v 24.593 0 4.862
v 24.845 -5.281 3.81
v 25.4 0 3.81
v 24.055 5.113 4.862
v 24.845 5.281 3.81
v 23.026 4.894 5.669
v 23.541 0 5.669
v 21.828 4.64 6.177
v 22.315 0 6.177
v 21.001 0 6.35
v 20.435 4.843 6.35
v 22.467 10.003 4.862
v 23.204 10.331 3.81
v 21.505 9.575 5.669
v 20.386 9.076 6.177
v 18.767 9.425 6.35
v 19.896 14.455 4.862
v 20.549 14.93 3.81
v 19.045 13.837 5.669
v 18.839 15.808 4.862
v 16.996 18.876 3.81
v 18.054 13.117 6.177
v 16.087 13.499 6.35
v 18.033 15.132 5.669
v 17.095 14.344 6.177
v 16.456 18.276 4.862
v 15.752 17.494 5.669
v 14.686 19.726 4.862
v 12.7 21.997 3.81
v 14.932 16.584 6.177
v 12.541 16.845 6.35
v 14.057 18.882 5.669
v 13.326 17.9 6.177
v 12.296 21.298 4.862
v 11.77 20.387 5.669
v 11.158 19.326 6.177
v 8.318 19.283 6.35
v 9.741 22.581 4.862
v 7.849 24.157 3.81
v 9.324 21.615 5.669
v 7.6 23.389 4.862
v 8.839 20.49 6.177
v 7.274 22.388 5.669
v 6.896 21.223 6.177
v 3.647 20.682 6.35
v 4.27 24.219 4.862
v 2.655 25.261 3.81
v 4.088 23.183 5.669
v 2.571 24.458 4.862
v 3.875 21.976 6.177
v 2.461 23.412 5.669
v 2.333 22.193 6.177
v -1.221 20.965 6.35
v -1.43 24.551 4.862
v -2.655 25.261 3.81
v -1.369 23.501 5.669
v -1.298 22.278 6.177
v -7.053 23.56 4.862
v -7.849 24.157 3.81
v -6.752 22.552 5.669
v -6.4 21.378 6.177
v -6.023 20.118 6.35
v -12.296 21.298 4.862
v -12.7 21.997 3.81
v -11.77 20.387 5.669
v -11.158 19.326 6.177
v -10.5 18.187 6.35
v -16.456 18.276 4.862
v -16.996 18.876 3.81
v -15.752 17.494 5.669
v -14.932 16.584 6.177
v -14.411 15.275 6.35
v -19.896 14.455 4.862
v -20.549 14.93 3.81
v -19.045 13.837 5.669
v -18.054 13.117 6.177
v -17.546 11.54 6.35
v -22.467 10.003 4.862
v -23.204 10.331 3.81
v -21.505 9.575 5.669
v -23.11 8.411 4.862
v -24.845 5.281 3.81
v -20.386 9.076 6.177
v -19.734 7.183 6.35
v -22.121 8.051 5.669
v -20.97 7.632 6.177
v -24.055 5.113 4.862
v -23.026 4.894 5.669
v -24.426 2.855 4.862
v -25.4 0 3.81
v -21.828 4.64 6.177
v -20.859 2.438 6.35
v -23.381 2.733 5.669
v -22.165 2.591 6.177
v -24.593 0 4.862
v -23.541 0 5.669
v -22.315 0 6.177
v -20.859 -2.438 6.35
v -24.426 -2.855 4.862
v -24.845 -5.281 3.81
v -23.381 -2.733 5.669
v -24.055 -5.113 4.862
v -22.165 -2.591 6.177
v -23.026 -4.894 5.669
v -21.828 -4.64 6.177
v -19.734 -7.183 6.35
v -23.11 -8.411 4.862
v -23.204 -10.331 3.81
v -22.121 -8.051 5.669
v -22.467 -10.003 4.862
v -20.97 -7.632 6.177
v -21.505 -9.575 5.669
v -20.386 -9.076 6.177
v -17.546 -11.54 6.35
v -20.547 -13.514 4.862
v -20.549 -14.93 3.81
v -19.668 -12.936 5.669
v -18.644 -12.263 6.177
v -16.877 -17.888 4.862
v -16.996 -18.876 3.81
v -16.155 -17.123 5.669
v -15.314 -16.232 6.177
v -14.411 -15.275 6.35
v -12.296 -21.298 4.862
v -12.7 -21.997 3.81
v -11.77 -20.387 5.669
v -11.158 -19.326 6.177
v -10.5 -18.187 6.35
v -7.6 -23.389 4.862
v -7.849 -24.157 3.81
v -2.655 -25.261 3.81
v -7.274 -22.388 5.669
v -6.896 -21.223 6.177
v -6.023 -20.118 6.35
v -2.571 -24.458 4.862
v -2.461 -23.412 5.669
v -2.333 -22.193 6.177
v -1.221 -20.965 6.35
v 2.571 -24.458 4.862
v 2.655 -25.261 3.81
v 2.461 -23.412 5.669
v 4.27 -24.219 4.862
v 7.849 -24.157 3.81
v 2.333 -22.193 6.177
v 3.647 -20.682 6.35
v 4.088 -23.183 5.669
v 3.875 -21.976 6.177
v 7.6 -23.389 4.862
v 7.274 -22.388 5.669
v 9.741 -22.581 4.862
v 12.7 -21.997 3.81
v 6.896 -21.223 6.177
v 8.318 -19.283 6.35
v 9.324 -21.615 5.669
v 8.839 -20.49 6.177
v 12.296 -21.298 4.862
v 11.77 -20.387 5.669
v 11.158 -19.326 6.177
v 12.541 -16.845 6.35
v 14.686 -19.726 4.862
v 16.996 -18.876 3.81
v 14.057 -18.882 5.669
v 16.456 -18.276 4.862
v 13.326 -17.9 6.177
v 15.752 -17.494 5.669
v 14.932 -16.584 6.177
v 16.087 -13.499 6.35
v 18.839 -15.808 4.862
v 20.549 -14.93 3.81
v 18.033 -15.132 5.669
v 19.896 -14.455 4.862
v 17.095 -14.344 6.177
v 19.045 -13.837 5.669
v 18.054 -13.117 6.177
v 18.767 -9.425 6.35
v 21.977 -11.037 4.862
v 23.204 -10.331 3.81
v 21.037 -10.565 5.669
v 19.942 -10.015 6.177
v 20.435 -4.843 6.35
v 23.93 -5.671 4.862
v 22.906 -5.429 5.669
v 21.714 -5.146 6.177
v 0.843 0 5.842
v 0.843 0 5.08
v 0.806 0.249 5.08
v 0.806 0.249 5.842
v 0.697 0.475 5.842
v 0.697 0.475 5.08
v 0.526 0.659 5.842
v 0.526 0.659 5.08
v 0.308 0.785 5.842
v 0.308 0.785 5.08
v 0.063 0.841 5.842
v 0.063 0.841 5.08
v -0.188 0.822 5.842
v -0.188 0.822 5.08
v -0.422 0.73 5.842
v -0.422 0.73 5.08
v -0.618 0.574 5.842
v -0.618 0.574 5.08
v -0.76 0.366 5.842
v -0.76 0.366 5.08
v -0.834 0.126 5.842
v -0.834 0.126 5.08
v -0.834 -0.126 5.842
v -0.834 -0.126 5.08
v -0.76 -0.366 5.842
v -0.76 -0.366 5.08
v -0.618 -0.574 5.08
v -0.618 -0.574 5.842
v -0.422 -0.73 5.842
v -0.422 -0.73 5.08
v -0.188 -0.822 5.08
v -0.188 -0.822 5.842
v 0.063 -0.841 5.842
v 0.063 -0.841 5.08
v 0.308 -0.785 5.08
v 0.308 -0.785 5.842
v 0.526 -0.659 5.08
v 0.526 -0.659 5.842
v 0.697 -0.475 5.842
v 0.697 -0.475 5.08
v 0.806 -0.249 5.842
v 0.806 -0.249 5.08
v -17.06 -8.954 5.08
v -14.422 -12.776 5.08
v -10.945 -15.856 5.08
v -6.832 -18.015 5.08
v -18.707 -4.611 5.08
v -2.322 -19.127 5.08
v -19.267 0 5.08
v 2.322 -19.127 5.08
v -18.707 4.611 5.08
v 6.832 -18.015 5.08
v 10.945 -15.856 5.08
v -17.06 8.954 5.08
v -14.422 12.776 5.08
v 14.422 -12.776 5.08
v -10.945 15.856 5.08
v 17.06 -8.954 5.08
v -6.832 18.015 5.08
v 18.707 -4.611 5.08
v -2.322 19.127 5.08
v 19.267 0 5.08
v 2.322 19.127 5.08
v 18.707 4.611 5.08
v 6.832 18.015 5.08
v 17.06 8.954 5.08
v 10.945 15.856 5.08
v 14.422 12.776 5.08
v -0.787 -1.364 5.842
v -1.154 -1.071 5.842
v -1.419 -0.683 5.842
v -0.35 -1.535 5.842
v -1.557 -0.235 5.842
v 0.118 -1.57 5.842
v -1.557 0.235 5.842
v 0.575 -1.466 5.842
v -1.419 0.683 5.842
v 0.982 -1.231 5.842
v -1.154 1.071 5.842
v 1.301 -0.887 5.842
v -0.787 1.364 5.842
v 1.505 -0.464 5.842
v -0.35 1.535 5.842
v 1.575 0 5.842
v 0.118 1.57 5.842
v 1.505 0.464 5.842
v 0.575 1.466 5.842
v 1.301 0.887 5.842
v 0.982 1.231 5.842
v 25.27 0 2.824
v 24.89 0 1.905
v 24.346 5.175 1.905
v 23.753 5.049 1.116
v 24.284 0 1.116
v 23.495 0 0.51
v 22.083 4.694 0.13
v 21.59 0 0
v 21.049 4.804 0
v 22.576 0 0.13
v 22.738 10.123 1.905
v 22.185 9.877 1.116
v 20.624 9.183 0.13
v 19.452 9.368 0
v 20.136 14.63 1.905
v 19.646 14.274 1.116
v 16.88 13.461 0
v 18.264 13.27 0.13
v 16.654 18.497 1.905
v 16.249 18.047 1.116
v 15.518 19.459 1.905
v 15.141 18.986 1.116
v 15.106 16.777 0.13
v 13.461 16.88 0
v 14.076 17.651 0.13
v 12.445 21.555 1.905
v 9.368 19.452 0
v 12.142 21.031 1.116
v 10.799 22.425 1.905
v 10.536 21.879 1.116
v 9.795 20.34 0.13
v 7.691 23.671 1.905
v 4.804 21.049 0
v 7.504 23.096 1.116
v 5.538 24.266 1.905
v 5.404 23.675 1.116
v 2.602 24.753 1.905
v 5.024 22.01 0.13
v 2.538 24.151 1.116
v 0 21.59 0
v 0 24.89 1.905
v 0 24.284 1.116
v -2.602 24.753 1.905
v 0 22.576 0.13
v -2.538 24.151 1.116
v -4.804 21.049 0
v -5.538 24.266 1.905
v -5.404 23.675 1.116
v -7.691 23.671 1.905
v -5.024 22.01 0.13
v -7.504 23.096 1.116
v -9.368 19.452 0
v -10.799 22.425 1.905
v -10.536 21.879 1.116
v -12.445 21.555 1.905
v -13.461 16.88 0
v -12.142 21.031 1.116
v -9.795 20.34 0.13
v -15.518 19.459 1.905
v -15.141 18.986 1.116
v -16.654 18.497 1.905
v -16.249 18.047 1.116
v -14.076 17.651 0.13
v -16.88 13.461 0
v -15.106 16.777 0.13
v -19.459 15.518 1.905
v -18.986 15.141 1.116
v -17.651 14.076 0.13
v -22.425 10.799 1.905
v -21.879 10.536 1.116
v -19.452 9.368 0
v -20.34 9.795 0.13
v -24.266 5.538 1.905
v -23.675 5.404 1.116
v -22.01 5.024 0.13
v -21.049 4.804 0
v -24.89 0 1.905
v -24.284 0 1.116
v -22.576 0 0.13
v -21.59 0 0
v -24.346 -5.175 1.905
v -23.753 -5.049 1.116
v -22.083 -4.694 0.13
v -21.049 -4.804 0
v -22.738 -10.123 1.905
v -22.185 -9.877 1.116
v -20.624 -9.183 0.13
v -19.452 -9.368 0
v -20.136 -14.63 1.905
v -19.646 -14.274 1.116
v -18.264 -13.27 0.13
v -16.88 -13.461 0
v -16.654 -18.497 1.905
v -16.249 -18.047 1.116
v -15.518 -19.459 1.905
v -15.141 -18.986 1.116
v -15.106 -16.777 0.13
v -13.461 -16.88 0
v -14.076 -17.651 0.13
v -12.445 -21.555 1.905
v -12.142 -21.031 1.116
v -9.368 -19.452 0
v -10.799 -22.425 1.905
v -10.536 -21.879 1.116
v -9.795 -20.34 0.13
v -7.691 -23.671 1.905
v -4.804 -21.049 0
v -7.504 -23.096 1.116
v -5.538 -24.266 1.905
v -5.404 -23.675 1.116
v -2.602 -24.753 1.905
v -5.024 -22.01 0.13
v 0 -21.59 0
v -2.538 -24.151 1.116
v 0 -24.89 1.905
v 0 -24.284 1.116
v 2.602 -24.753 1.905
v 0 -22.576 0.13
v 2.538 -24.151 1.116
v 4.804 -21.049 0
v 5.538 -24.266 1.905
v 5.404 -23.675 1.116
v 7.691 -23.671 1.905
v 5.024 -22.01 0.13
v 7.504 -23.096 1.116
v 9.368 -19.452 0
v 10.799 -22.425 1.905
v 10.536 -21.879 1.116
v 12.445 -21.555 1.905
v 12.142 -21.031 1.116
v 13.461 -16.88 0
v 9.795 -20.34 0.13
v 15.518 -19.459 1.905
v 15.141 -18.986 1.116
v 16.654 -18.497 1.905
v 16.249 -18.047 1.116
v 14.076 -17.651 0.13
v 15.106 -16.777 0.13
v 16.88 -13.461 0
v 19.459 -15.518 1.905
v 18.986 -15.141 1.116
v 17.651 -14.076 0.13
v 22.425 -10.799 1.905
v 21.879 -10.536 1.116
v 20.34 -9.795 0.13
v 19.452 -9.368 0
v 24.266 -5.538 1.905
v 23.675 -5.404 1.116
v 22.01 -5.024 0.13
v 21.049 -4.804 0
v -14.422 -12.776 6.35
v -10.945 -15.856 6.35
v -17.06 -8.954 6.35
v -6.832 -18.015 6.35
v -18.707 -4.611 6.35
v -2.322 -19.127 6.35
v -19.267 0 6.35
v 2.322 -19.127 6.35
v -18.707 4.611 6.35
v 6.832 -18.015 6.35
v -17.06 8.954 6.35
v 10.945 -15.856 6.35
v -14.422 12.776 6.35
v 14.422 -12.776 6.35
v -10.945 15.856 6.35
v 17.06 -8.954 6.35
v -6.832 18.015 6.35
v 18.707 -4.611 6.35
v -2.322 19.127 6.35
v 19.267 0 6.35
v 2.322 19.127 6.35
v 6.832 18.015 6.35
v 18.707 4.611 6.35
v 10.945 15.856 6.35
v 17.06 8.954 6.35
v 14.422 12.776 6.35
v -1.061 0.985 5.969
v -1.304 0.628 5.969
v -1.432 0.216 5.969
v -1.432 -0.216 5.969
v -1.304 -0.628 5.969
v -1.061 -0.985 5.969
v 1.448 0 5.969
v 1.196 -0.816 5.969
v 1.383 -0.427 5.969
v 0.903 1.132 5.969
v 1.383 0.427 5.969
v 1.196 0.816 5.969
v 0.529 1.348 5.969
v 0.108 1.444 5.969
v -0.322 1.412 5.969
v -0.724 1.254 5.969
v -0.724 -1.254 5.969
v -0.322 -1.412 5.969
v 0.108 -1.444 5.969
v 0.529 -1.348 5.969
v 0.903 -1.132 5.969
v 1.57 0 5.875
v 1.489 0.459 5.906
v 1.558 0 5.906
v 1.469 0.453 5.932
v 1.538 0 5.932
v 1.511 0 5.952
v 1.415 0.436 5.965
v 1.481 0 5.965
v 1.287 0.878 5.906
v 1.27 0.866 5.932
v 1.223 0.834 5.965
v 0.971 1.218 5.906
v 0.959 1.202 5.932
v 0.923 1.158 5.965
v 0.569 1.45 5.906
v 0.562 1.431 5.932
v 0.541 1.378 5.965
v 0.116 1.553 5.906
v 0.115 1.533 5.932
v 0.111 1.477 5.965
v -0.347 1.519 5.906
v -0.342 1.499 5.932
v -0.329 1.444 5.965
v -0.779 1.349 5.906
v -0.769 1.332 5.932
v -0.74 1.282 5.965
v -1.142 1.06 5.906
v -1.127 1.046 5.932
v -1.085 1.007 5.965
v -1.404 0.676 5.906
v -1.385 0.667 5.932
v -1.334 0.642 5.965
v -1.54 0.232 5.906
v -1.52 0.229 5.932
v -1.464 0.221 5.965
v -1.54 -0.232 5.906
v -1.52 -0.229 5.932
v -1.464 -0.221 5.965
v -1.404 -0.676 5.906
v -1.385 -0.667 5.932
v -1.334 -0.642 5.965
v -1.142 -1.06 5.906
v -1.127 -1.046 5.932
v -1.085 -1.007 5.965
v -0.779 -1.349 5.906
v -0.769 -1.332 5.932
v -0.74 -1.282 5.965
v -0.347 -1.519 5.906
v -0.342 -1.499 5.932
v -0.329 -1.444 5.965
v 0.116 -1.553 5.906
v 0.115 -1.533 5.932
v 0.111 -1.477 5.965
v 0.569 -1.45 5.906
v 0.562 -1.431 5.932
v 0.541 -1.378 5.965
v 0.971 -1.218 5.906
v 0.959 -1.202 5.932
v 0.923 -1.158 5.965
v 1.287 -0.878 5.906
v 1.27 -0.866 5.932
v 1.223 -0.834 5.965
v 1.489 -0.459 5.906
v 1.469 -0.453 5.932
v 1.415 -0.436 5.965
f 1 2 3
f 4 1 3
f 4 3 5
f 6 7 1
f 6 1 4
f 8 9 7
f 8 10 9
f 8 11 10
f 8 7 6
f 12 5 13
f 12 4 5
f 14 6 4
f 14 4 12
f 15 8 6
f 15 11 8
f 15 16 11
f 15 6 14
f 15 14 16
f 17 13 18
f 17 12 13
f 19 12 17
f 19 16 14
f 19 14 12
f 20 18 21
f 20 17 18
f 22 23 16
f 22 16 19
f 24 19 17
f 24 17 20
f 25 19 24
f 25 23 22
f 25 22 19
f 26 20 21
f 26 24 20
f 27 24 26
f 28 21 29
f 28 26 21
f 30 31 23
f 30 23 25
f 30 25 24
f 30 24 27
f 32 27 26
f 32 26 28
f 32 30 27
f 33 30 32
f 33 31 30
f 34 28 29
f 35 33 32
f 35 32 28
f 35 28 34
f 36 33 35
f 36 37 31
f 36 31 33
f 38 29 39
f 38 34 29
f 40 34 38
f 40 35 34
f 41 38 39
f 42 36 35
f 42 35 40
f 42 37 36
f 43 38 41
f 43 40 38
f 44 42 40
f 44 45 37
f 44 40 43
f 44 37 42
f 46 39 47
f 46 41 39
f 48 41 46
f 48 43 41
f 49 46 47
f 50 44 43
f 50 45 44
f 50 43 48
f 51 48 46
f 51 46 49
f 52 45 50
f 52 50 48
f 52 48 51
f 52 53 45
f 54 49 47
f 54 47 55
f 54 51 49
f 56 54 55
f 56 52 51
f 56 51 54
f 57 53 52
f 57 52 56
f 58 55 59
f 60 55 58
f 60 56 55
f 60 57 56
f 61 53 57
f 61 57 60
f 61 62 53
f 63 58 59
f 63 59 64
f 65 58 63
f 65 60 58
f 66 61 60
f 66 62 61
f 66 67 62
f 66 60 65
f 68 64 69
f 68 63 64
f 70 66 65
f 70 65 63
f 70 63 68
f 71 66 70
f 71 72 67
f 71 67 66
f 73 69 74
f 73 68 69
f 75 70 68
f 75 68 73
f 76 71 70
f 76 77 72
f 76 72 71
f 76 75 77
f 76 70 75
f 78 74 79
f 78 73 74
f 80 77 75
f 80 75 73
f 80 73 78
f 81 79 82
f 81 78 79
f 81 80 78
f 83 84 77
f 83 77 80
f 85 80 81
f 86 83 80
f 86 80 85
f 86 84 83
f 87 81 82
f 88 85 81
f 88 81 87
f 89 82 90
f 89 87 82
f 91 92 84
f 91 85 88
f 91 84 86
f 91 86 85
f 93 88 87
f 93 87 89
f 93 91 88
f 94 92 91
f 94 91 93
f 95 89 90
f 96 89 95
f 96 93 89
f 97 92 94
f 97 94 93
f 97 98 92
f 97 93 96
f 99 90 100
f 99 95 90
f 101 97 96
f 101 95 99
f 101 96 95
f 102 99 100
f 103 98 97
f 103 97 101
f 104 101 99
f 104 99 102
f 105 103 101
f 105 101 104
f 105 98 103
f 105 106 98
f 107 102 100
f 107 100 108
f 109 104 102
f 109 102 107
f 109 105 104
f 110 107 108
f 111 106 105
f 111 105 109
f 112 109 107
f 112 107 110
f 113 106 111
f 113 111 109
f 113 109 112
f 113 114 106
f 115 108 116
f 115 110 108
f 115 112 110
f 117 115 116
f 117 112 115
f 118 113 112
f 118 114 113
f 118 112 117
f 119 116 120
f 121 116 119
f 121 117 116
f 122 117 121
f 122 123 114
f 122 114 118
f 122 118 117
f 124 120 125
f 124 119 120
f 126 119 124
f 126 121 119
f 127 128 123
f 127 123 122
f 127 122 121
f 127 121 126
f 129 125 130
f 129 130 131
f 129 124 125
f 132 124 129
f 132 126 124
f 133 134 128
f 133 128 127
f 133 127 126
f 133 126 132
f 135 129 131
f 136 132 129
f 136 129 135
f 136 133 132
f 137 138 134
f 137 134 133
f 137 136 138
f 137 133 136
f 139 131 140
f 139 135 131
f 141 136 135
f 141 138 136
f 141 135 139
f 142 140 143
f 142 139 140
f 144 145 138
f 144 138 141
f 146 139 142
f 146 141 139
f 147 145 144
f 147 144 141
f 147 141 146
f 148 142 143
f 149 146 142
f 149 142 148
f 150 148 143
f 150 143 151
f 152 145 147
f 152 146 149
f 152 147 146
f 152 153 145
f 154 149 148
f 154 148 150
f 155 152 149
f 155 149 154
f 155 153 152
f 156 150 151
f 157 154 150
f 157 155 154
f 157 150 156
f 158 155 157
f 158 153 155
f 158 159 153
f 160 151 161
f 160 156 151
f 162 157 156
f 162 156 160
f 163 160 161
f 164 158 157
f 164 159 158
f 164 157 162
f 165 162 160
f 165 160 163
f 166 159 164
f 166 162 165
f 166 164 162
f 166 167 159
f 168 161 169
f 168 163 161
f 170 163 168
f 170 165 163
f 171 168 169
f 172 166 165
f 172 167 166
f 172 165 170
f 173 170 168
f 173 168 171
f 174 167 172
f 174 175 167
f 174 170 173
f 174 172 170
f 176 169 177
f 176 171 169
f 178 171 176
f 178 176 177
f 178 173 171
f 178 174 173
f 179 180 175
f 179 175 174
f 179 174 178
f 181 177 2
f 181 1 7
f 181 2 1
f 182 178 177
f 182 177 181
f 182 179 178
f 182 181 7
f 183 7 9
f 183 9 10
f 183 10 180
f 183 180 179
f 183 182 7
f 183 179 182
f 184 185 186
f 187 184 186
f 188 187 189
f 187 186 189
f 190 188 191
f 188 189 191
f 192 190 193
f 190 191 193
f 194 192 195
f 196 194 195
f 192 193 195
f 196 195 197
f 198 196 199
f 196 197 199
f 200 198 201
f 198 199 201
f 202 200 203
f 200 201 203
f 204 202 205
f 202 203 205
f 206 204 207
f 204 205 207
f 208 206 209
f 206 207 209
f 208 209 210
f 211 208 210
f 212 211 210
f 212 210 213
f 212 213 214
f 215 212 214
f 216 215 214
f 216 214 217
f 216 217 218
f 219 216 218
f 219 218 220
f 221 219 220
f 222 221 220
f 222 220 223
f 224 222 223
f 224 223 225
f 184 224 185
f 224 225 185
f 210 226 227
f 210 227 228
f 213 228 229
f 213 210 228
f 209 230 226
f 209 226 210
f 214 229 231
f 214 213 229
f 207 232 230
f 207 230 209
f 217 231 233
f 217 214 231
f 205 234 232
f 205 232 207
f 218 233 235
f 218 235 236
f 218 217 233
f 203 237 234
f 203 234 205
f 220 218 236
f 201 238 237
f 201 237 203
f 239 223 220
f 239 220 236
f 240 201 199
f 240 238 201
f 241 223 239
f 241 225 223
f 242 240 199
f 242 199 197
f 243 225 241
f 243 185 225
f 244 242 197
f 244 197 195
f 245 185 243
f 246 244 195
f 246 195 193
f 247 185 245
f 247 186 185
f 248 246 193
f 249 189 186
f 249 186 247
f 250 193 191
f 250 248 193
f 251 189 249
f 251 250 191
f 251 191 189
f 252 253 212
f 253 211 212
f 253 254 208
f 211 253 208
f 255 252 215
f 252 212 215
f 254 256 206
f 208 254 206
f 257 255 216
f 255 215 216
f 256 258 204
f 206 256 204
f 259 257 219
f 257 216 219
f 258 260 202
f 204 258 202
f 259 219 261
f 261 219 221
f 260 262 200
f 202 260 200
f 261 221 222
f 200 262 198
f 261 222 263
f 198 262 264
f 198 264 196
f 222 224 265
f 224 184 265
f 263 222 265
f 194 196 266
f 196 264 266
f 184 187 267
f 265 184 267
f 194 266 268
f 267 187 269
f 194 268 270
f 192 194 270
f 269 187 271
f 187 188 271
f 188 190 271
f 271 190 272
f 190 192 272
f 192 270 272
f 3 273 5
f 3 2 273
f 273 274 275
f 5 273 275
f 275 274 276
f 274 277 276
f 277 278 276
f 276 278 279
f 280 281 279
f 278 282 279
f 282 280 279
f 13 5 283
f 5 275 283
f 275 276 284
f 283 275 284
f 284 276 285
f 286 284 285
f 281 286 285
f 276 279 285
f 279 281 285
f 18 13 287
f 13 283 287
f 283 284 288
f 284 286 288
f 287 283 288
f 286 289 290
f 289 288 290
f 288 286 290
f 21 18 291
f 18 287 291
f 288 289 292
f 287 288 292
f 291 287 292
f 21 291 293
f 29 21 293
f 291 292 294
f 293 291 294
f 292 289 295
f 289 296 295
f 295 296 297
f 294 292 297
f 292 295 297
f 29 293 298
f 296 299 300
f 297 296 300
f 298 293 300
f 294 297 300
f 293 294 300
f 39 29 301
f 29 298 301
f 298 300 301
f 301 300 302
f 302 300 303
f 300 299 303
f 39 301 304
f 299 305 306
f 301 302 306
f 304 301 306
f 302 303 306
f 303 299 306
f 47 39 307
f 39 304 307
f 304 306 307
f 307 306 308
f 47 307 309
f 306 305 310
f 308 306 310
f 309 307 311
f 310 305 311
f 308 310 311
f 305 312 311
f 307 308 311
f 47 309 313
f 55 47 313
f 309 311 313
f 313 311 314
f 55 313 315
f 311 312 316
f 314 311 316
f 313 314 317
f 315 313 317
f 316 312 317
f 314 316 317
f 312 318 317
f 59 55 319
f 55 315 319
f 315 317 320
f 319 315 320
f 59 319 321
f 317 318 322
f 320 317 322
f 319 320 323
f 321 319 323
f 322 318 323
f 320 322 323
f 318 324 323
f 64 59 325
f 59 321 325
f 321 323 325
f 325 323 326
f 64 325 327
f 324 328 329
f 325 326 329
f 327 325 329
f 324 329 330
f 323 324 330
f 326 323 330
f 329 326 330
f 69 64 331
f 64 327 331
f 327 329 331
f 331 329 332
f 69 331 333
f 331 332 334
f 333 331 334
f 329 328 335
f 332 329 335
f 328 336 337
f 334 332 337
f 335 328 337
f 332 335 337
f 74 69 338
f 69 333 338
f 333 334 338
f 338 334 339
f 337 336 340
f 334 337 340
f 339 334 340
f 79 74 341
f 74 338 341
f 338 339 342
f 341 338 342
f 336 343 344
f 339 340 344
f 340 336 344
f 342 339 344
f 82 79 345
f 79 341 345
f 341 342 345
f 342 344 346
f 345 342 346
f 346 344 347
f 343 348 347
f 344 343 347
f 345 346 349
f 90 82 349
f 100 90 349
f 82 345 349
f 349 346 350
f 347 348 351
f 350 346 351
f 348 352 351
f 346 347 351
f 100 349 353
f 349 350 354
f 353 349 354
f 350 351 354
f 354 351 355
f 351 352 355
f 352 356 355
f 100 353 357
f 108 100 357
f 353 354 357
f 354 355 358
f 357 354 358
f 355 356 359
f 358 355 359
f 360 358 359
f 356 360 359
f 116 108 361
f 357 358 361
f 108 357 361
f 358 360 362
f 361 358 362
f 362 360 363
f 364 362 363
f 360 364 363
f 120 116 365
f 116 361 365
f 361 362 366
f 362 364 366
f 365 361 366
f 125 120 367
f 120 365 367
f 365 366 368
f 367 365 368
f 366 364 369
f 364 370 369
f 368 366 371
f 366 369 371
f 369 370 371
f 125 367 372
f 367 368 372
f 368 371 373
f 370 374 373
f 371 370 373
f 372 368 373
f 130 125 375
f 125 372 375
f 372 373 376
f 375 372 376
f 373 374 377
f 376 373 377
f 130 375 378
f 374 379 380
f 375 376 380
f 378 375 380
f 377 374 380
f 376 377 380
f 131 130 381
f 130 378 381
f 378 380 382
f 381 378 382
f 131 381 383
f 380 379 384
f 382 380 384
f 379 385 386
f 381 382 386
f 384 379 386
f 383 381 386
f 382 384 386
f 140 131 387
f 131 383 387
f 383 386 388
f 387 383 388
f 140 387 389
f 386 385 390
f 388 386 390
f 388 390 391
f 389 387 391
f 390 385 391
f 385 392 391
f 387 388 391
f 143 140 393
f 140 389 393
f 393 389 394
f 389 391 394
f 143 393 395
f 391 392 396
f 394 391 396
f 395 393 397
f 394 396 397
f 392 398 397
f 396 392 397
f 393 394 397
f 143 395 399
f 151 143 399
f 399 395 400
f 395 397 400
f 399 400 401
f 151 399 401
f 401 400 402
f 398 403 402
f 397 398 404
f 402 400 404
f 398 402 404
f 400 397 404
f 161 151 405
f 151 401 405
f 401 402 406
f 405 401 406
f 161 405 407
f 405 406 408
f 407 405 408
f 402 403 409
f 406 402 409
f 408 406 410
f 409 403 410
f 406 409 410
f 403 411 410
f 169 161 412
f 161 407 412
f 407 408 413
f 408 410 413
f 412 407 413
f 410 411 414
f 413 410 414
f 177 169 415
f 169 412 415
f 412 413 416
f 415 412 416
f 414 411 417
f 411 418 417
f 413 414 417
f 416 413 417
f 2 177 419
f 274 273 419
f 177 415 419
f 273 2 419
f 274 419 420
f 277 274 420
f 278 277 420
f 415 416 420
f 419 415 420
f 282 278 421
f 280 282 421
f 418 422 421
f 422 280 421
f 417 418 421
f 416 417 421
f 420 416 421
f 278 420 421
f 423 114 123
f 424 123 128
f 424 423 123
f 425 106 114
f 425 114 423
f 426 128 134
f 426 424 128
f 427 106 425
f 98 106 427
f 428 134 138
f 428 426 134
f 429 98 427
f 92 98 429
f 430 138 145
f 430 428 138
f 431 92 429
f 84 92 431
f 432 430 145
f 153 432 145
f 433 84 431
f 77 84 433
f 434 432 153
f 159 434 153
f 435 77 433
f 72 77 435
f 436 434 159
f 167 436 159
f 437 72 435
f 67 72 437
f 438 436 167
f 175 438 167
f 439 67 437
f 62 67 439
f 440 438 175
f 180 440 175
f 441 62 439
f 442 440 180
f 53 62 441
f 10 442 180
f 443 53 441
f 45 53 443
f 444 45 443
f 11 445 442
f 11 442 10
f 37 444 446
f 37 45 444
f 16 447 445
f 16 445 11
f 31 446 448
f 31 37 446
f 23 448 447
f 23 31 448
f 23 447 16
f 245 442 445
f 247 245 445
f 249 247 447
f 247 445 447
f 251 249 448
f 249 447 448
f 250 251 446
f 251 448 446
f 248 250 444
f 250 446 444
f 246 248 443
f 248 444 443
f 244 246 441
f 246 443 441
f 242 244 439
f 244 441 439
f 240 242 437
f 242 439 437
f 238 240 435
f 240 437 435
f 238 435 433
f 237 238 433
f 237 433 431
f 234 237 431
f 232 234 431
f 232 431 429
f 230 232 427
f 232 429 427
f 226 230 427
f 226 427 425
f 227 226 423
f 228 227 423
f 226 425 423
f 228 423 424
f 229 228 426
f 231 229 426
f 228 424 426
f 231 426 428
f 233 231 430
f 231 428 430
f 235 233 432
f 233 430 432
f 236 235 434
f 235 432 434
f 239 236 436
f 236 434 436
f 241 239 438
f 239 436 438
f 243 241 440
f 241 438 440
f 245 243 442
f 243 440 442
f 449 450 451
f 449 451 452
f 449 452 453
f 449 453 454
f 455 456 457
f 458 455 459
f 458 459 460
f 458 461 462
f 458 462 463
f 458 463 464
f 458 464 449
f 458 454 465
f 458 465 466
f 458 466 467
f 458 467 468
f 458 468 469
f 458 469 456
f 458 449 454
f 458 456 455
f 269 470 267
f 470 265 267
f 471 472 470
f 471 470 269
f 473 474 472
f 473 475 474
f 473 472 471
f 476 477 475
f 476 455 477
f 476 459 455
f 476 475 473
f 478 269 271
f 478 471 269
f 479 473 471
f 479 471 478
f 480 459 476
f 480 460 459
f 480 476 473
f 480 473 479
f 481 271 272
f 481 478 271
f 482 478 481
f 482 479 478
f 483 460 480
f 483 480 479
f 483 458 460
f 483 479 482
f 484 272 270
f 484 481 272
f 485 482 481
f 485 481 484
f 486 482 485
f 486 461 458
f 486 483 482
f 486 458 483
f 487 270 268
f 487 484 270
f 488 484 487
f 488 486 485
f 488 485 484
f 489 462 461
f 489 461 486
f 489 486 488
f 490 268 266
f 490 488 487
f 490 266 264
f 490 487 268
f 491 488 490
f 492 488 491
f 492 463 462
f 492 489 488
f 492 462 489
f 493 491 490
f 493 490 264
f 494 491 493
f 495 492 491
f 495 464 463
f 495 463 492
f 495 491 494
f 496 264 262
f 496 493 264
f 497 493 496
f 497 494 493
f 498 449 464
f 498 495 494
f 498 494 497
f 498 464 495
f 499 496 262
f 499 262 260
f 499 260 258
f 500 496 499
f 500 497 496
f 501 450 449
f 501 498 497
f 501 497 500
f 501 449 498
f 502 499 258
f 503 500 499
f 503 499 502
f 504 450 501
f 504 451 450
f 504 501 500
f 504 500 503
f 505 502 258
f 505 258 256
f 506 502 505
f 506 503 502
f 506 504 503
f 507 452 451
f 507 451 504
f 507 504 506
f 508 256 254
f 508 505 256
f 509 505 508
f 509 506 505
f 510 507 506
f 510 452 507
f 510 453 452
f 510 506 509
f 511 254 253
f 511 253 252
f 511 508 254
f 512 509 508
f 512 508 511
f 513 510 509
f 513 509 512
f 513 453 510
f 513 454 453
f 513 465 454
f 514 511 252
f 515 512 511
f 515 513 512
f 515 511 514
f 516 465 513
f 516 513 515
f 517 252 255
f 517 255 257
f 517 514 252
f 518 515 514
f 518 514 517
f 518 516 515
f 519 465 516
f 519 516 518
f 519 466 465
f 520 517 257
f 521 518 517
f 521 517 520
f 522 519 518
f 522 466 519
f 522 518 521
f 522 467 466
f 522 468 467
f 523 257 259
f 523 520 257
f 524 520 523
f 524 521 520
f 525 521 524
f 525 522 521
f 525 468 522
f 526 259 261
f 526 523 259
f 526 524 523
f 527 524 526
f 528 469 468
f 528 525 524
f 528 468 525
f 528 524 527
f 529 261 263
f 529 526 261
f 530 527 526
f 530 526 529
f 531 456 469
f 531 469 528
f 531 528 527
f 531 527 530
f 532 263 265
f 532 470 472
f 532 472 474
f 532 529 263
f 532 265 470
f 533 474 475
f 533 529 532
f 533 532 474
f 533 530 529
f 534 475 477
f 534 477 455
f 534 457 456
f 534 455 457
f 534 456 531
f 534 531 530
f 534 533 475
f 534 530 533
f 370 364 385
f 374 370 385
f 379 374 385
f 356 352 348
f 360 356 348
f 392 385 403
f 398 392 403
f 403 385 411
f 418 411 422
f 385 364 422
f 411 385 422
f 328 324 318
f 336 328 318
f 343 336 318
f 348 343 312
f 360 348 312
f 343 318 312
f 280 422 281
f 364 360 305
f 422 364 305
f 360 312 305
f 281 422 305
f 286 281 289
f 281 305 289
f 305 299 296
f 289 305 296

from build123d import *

# Parameters (mm, degrees)
F0_R     = 25.4
F1_DEPTH = 6.35
F2_R     = 3.81
F4_R     = 19.2670598269
F5_DEPTH = 1.27
F6_R     = 0.8432395902
F7_DEPTH = 0.762
F8_R     = 1.5748
F8_R_2   = 0.8432395902
F9_DEPTH = 0.127
F10_R    = 0.12699


# Not quite as in the source:
# - a fillet or chamfer that OpenCascade refuses, or shapes differently, is made with other operations: its cross-section is extruded or revolved along the edge and cut away or added
# - a fillet or chamfer is up to 0.001 mm smaller than in the source, because OpenCascade refuses the exact size


with BuildPart() as f1:
    # F0 (on Top) → F1 (new body)
    with BuildSketch(Plane.XY):
        Circle(F0_R)
    extrude(amount=F1_DEPTH)

    # F2
    f2_edges = [f1.edges().sort_by_distance(p)[0] for p in [
        (-25.4, 0, 0),
    ]]
    fillet(f2_edges, radius=F2_R)

    # F3: fillet of radius 5.08 on 1 edges, made by hand

    # F3_s1 → F3_t2 (revolve, cut)
    with BuildSketch(Plane.XZ):
        with BuildLine():
            ThreePointArc((25.4, 3.81), (23.5405909488, 5.6694090512), (21.0005909488, 6.35))
            Line((21.0005909488, 6.35), (25.4, 6.35))
            Line((25.4, 6.35), (25.4, 3.81))
        make_face()
    revolve(axis=Axis((0, 0, 6.35), (0, 0, 1)), mode=Mode.SUBTRACT)

    # F4 (on face) → F5 (cut)
    with BuildSketch(Plane.XY.offset(6.35)):
        Circle(F4_R)
    extrude(amount=-F5_DEPTH, mode=Mode.SUBTRACT)

    # F6 (on face) → F7 (join)
    with BuildSketch(Plane.XY.offset(5.08)):
        Circle(F6_R)
    extrude(amount=F7_DEPTH)

    # F8 (on face) → F9 (join)
    with BuildSketch(Plane.XY.offset(5.842)):
        Circle(F8_R)
        Circle(F8_R_2, mode=Mode.SUBTRACT)
        Circle(F8_R_2)
    extrude(amount=F9_DEPTH)

    # F10 (radius 0.127 in the source; OpenCascade refuses exactly that, so slightly less here)
    f10_edges = [f1.edges().sort_by_distance(p)[0] for p in [
        (-1.5748, 0, 5.969),
    ]]
    fillet(f10_edges, radius=F10_R)


solid = f1.part
